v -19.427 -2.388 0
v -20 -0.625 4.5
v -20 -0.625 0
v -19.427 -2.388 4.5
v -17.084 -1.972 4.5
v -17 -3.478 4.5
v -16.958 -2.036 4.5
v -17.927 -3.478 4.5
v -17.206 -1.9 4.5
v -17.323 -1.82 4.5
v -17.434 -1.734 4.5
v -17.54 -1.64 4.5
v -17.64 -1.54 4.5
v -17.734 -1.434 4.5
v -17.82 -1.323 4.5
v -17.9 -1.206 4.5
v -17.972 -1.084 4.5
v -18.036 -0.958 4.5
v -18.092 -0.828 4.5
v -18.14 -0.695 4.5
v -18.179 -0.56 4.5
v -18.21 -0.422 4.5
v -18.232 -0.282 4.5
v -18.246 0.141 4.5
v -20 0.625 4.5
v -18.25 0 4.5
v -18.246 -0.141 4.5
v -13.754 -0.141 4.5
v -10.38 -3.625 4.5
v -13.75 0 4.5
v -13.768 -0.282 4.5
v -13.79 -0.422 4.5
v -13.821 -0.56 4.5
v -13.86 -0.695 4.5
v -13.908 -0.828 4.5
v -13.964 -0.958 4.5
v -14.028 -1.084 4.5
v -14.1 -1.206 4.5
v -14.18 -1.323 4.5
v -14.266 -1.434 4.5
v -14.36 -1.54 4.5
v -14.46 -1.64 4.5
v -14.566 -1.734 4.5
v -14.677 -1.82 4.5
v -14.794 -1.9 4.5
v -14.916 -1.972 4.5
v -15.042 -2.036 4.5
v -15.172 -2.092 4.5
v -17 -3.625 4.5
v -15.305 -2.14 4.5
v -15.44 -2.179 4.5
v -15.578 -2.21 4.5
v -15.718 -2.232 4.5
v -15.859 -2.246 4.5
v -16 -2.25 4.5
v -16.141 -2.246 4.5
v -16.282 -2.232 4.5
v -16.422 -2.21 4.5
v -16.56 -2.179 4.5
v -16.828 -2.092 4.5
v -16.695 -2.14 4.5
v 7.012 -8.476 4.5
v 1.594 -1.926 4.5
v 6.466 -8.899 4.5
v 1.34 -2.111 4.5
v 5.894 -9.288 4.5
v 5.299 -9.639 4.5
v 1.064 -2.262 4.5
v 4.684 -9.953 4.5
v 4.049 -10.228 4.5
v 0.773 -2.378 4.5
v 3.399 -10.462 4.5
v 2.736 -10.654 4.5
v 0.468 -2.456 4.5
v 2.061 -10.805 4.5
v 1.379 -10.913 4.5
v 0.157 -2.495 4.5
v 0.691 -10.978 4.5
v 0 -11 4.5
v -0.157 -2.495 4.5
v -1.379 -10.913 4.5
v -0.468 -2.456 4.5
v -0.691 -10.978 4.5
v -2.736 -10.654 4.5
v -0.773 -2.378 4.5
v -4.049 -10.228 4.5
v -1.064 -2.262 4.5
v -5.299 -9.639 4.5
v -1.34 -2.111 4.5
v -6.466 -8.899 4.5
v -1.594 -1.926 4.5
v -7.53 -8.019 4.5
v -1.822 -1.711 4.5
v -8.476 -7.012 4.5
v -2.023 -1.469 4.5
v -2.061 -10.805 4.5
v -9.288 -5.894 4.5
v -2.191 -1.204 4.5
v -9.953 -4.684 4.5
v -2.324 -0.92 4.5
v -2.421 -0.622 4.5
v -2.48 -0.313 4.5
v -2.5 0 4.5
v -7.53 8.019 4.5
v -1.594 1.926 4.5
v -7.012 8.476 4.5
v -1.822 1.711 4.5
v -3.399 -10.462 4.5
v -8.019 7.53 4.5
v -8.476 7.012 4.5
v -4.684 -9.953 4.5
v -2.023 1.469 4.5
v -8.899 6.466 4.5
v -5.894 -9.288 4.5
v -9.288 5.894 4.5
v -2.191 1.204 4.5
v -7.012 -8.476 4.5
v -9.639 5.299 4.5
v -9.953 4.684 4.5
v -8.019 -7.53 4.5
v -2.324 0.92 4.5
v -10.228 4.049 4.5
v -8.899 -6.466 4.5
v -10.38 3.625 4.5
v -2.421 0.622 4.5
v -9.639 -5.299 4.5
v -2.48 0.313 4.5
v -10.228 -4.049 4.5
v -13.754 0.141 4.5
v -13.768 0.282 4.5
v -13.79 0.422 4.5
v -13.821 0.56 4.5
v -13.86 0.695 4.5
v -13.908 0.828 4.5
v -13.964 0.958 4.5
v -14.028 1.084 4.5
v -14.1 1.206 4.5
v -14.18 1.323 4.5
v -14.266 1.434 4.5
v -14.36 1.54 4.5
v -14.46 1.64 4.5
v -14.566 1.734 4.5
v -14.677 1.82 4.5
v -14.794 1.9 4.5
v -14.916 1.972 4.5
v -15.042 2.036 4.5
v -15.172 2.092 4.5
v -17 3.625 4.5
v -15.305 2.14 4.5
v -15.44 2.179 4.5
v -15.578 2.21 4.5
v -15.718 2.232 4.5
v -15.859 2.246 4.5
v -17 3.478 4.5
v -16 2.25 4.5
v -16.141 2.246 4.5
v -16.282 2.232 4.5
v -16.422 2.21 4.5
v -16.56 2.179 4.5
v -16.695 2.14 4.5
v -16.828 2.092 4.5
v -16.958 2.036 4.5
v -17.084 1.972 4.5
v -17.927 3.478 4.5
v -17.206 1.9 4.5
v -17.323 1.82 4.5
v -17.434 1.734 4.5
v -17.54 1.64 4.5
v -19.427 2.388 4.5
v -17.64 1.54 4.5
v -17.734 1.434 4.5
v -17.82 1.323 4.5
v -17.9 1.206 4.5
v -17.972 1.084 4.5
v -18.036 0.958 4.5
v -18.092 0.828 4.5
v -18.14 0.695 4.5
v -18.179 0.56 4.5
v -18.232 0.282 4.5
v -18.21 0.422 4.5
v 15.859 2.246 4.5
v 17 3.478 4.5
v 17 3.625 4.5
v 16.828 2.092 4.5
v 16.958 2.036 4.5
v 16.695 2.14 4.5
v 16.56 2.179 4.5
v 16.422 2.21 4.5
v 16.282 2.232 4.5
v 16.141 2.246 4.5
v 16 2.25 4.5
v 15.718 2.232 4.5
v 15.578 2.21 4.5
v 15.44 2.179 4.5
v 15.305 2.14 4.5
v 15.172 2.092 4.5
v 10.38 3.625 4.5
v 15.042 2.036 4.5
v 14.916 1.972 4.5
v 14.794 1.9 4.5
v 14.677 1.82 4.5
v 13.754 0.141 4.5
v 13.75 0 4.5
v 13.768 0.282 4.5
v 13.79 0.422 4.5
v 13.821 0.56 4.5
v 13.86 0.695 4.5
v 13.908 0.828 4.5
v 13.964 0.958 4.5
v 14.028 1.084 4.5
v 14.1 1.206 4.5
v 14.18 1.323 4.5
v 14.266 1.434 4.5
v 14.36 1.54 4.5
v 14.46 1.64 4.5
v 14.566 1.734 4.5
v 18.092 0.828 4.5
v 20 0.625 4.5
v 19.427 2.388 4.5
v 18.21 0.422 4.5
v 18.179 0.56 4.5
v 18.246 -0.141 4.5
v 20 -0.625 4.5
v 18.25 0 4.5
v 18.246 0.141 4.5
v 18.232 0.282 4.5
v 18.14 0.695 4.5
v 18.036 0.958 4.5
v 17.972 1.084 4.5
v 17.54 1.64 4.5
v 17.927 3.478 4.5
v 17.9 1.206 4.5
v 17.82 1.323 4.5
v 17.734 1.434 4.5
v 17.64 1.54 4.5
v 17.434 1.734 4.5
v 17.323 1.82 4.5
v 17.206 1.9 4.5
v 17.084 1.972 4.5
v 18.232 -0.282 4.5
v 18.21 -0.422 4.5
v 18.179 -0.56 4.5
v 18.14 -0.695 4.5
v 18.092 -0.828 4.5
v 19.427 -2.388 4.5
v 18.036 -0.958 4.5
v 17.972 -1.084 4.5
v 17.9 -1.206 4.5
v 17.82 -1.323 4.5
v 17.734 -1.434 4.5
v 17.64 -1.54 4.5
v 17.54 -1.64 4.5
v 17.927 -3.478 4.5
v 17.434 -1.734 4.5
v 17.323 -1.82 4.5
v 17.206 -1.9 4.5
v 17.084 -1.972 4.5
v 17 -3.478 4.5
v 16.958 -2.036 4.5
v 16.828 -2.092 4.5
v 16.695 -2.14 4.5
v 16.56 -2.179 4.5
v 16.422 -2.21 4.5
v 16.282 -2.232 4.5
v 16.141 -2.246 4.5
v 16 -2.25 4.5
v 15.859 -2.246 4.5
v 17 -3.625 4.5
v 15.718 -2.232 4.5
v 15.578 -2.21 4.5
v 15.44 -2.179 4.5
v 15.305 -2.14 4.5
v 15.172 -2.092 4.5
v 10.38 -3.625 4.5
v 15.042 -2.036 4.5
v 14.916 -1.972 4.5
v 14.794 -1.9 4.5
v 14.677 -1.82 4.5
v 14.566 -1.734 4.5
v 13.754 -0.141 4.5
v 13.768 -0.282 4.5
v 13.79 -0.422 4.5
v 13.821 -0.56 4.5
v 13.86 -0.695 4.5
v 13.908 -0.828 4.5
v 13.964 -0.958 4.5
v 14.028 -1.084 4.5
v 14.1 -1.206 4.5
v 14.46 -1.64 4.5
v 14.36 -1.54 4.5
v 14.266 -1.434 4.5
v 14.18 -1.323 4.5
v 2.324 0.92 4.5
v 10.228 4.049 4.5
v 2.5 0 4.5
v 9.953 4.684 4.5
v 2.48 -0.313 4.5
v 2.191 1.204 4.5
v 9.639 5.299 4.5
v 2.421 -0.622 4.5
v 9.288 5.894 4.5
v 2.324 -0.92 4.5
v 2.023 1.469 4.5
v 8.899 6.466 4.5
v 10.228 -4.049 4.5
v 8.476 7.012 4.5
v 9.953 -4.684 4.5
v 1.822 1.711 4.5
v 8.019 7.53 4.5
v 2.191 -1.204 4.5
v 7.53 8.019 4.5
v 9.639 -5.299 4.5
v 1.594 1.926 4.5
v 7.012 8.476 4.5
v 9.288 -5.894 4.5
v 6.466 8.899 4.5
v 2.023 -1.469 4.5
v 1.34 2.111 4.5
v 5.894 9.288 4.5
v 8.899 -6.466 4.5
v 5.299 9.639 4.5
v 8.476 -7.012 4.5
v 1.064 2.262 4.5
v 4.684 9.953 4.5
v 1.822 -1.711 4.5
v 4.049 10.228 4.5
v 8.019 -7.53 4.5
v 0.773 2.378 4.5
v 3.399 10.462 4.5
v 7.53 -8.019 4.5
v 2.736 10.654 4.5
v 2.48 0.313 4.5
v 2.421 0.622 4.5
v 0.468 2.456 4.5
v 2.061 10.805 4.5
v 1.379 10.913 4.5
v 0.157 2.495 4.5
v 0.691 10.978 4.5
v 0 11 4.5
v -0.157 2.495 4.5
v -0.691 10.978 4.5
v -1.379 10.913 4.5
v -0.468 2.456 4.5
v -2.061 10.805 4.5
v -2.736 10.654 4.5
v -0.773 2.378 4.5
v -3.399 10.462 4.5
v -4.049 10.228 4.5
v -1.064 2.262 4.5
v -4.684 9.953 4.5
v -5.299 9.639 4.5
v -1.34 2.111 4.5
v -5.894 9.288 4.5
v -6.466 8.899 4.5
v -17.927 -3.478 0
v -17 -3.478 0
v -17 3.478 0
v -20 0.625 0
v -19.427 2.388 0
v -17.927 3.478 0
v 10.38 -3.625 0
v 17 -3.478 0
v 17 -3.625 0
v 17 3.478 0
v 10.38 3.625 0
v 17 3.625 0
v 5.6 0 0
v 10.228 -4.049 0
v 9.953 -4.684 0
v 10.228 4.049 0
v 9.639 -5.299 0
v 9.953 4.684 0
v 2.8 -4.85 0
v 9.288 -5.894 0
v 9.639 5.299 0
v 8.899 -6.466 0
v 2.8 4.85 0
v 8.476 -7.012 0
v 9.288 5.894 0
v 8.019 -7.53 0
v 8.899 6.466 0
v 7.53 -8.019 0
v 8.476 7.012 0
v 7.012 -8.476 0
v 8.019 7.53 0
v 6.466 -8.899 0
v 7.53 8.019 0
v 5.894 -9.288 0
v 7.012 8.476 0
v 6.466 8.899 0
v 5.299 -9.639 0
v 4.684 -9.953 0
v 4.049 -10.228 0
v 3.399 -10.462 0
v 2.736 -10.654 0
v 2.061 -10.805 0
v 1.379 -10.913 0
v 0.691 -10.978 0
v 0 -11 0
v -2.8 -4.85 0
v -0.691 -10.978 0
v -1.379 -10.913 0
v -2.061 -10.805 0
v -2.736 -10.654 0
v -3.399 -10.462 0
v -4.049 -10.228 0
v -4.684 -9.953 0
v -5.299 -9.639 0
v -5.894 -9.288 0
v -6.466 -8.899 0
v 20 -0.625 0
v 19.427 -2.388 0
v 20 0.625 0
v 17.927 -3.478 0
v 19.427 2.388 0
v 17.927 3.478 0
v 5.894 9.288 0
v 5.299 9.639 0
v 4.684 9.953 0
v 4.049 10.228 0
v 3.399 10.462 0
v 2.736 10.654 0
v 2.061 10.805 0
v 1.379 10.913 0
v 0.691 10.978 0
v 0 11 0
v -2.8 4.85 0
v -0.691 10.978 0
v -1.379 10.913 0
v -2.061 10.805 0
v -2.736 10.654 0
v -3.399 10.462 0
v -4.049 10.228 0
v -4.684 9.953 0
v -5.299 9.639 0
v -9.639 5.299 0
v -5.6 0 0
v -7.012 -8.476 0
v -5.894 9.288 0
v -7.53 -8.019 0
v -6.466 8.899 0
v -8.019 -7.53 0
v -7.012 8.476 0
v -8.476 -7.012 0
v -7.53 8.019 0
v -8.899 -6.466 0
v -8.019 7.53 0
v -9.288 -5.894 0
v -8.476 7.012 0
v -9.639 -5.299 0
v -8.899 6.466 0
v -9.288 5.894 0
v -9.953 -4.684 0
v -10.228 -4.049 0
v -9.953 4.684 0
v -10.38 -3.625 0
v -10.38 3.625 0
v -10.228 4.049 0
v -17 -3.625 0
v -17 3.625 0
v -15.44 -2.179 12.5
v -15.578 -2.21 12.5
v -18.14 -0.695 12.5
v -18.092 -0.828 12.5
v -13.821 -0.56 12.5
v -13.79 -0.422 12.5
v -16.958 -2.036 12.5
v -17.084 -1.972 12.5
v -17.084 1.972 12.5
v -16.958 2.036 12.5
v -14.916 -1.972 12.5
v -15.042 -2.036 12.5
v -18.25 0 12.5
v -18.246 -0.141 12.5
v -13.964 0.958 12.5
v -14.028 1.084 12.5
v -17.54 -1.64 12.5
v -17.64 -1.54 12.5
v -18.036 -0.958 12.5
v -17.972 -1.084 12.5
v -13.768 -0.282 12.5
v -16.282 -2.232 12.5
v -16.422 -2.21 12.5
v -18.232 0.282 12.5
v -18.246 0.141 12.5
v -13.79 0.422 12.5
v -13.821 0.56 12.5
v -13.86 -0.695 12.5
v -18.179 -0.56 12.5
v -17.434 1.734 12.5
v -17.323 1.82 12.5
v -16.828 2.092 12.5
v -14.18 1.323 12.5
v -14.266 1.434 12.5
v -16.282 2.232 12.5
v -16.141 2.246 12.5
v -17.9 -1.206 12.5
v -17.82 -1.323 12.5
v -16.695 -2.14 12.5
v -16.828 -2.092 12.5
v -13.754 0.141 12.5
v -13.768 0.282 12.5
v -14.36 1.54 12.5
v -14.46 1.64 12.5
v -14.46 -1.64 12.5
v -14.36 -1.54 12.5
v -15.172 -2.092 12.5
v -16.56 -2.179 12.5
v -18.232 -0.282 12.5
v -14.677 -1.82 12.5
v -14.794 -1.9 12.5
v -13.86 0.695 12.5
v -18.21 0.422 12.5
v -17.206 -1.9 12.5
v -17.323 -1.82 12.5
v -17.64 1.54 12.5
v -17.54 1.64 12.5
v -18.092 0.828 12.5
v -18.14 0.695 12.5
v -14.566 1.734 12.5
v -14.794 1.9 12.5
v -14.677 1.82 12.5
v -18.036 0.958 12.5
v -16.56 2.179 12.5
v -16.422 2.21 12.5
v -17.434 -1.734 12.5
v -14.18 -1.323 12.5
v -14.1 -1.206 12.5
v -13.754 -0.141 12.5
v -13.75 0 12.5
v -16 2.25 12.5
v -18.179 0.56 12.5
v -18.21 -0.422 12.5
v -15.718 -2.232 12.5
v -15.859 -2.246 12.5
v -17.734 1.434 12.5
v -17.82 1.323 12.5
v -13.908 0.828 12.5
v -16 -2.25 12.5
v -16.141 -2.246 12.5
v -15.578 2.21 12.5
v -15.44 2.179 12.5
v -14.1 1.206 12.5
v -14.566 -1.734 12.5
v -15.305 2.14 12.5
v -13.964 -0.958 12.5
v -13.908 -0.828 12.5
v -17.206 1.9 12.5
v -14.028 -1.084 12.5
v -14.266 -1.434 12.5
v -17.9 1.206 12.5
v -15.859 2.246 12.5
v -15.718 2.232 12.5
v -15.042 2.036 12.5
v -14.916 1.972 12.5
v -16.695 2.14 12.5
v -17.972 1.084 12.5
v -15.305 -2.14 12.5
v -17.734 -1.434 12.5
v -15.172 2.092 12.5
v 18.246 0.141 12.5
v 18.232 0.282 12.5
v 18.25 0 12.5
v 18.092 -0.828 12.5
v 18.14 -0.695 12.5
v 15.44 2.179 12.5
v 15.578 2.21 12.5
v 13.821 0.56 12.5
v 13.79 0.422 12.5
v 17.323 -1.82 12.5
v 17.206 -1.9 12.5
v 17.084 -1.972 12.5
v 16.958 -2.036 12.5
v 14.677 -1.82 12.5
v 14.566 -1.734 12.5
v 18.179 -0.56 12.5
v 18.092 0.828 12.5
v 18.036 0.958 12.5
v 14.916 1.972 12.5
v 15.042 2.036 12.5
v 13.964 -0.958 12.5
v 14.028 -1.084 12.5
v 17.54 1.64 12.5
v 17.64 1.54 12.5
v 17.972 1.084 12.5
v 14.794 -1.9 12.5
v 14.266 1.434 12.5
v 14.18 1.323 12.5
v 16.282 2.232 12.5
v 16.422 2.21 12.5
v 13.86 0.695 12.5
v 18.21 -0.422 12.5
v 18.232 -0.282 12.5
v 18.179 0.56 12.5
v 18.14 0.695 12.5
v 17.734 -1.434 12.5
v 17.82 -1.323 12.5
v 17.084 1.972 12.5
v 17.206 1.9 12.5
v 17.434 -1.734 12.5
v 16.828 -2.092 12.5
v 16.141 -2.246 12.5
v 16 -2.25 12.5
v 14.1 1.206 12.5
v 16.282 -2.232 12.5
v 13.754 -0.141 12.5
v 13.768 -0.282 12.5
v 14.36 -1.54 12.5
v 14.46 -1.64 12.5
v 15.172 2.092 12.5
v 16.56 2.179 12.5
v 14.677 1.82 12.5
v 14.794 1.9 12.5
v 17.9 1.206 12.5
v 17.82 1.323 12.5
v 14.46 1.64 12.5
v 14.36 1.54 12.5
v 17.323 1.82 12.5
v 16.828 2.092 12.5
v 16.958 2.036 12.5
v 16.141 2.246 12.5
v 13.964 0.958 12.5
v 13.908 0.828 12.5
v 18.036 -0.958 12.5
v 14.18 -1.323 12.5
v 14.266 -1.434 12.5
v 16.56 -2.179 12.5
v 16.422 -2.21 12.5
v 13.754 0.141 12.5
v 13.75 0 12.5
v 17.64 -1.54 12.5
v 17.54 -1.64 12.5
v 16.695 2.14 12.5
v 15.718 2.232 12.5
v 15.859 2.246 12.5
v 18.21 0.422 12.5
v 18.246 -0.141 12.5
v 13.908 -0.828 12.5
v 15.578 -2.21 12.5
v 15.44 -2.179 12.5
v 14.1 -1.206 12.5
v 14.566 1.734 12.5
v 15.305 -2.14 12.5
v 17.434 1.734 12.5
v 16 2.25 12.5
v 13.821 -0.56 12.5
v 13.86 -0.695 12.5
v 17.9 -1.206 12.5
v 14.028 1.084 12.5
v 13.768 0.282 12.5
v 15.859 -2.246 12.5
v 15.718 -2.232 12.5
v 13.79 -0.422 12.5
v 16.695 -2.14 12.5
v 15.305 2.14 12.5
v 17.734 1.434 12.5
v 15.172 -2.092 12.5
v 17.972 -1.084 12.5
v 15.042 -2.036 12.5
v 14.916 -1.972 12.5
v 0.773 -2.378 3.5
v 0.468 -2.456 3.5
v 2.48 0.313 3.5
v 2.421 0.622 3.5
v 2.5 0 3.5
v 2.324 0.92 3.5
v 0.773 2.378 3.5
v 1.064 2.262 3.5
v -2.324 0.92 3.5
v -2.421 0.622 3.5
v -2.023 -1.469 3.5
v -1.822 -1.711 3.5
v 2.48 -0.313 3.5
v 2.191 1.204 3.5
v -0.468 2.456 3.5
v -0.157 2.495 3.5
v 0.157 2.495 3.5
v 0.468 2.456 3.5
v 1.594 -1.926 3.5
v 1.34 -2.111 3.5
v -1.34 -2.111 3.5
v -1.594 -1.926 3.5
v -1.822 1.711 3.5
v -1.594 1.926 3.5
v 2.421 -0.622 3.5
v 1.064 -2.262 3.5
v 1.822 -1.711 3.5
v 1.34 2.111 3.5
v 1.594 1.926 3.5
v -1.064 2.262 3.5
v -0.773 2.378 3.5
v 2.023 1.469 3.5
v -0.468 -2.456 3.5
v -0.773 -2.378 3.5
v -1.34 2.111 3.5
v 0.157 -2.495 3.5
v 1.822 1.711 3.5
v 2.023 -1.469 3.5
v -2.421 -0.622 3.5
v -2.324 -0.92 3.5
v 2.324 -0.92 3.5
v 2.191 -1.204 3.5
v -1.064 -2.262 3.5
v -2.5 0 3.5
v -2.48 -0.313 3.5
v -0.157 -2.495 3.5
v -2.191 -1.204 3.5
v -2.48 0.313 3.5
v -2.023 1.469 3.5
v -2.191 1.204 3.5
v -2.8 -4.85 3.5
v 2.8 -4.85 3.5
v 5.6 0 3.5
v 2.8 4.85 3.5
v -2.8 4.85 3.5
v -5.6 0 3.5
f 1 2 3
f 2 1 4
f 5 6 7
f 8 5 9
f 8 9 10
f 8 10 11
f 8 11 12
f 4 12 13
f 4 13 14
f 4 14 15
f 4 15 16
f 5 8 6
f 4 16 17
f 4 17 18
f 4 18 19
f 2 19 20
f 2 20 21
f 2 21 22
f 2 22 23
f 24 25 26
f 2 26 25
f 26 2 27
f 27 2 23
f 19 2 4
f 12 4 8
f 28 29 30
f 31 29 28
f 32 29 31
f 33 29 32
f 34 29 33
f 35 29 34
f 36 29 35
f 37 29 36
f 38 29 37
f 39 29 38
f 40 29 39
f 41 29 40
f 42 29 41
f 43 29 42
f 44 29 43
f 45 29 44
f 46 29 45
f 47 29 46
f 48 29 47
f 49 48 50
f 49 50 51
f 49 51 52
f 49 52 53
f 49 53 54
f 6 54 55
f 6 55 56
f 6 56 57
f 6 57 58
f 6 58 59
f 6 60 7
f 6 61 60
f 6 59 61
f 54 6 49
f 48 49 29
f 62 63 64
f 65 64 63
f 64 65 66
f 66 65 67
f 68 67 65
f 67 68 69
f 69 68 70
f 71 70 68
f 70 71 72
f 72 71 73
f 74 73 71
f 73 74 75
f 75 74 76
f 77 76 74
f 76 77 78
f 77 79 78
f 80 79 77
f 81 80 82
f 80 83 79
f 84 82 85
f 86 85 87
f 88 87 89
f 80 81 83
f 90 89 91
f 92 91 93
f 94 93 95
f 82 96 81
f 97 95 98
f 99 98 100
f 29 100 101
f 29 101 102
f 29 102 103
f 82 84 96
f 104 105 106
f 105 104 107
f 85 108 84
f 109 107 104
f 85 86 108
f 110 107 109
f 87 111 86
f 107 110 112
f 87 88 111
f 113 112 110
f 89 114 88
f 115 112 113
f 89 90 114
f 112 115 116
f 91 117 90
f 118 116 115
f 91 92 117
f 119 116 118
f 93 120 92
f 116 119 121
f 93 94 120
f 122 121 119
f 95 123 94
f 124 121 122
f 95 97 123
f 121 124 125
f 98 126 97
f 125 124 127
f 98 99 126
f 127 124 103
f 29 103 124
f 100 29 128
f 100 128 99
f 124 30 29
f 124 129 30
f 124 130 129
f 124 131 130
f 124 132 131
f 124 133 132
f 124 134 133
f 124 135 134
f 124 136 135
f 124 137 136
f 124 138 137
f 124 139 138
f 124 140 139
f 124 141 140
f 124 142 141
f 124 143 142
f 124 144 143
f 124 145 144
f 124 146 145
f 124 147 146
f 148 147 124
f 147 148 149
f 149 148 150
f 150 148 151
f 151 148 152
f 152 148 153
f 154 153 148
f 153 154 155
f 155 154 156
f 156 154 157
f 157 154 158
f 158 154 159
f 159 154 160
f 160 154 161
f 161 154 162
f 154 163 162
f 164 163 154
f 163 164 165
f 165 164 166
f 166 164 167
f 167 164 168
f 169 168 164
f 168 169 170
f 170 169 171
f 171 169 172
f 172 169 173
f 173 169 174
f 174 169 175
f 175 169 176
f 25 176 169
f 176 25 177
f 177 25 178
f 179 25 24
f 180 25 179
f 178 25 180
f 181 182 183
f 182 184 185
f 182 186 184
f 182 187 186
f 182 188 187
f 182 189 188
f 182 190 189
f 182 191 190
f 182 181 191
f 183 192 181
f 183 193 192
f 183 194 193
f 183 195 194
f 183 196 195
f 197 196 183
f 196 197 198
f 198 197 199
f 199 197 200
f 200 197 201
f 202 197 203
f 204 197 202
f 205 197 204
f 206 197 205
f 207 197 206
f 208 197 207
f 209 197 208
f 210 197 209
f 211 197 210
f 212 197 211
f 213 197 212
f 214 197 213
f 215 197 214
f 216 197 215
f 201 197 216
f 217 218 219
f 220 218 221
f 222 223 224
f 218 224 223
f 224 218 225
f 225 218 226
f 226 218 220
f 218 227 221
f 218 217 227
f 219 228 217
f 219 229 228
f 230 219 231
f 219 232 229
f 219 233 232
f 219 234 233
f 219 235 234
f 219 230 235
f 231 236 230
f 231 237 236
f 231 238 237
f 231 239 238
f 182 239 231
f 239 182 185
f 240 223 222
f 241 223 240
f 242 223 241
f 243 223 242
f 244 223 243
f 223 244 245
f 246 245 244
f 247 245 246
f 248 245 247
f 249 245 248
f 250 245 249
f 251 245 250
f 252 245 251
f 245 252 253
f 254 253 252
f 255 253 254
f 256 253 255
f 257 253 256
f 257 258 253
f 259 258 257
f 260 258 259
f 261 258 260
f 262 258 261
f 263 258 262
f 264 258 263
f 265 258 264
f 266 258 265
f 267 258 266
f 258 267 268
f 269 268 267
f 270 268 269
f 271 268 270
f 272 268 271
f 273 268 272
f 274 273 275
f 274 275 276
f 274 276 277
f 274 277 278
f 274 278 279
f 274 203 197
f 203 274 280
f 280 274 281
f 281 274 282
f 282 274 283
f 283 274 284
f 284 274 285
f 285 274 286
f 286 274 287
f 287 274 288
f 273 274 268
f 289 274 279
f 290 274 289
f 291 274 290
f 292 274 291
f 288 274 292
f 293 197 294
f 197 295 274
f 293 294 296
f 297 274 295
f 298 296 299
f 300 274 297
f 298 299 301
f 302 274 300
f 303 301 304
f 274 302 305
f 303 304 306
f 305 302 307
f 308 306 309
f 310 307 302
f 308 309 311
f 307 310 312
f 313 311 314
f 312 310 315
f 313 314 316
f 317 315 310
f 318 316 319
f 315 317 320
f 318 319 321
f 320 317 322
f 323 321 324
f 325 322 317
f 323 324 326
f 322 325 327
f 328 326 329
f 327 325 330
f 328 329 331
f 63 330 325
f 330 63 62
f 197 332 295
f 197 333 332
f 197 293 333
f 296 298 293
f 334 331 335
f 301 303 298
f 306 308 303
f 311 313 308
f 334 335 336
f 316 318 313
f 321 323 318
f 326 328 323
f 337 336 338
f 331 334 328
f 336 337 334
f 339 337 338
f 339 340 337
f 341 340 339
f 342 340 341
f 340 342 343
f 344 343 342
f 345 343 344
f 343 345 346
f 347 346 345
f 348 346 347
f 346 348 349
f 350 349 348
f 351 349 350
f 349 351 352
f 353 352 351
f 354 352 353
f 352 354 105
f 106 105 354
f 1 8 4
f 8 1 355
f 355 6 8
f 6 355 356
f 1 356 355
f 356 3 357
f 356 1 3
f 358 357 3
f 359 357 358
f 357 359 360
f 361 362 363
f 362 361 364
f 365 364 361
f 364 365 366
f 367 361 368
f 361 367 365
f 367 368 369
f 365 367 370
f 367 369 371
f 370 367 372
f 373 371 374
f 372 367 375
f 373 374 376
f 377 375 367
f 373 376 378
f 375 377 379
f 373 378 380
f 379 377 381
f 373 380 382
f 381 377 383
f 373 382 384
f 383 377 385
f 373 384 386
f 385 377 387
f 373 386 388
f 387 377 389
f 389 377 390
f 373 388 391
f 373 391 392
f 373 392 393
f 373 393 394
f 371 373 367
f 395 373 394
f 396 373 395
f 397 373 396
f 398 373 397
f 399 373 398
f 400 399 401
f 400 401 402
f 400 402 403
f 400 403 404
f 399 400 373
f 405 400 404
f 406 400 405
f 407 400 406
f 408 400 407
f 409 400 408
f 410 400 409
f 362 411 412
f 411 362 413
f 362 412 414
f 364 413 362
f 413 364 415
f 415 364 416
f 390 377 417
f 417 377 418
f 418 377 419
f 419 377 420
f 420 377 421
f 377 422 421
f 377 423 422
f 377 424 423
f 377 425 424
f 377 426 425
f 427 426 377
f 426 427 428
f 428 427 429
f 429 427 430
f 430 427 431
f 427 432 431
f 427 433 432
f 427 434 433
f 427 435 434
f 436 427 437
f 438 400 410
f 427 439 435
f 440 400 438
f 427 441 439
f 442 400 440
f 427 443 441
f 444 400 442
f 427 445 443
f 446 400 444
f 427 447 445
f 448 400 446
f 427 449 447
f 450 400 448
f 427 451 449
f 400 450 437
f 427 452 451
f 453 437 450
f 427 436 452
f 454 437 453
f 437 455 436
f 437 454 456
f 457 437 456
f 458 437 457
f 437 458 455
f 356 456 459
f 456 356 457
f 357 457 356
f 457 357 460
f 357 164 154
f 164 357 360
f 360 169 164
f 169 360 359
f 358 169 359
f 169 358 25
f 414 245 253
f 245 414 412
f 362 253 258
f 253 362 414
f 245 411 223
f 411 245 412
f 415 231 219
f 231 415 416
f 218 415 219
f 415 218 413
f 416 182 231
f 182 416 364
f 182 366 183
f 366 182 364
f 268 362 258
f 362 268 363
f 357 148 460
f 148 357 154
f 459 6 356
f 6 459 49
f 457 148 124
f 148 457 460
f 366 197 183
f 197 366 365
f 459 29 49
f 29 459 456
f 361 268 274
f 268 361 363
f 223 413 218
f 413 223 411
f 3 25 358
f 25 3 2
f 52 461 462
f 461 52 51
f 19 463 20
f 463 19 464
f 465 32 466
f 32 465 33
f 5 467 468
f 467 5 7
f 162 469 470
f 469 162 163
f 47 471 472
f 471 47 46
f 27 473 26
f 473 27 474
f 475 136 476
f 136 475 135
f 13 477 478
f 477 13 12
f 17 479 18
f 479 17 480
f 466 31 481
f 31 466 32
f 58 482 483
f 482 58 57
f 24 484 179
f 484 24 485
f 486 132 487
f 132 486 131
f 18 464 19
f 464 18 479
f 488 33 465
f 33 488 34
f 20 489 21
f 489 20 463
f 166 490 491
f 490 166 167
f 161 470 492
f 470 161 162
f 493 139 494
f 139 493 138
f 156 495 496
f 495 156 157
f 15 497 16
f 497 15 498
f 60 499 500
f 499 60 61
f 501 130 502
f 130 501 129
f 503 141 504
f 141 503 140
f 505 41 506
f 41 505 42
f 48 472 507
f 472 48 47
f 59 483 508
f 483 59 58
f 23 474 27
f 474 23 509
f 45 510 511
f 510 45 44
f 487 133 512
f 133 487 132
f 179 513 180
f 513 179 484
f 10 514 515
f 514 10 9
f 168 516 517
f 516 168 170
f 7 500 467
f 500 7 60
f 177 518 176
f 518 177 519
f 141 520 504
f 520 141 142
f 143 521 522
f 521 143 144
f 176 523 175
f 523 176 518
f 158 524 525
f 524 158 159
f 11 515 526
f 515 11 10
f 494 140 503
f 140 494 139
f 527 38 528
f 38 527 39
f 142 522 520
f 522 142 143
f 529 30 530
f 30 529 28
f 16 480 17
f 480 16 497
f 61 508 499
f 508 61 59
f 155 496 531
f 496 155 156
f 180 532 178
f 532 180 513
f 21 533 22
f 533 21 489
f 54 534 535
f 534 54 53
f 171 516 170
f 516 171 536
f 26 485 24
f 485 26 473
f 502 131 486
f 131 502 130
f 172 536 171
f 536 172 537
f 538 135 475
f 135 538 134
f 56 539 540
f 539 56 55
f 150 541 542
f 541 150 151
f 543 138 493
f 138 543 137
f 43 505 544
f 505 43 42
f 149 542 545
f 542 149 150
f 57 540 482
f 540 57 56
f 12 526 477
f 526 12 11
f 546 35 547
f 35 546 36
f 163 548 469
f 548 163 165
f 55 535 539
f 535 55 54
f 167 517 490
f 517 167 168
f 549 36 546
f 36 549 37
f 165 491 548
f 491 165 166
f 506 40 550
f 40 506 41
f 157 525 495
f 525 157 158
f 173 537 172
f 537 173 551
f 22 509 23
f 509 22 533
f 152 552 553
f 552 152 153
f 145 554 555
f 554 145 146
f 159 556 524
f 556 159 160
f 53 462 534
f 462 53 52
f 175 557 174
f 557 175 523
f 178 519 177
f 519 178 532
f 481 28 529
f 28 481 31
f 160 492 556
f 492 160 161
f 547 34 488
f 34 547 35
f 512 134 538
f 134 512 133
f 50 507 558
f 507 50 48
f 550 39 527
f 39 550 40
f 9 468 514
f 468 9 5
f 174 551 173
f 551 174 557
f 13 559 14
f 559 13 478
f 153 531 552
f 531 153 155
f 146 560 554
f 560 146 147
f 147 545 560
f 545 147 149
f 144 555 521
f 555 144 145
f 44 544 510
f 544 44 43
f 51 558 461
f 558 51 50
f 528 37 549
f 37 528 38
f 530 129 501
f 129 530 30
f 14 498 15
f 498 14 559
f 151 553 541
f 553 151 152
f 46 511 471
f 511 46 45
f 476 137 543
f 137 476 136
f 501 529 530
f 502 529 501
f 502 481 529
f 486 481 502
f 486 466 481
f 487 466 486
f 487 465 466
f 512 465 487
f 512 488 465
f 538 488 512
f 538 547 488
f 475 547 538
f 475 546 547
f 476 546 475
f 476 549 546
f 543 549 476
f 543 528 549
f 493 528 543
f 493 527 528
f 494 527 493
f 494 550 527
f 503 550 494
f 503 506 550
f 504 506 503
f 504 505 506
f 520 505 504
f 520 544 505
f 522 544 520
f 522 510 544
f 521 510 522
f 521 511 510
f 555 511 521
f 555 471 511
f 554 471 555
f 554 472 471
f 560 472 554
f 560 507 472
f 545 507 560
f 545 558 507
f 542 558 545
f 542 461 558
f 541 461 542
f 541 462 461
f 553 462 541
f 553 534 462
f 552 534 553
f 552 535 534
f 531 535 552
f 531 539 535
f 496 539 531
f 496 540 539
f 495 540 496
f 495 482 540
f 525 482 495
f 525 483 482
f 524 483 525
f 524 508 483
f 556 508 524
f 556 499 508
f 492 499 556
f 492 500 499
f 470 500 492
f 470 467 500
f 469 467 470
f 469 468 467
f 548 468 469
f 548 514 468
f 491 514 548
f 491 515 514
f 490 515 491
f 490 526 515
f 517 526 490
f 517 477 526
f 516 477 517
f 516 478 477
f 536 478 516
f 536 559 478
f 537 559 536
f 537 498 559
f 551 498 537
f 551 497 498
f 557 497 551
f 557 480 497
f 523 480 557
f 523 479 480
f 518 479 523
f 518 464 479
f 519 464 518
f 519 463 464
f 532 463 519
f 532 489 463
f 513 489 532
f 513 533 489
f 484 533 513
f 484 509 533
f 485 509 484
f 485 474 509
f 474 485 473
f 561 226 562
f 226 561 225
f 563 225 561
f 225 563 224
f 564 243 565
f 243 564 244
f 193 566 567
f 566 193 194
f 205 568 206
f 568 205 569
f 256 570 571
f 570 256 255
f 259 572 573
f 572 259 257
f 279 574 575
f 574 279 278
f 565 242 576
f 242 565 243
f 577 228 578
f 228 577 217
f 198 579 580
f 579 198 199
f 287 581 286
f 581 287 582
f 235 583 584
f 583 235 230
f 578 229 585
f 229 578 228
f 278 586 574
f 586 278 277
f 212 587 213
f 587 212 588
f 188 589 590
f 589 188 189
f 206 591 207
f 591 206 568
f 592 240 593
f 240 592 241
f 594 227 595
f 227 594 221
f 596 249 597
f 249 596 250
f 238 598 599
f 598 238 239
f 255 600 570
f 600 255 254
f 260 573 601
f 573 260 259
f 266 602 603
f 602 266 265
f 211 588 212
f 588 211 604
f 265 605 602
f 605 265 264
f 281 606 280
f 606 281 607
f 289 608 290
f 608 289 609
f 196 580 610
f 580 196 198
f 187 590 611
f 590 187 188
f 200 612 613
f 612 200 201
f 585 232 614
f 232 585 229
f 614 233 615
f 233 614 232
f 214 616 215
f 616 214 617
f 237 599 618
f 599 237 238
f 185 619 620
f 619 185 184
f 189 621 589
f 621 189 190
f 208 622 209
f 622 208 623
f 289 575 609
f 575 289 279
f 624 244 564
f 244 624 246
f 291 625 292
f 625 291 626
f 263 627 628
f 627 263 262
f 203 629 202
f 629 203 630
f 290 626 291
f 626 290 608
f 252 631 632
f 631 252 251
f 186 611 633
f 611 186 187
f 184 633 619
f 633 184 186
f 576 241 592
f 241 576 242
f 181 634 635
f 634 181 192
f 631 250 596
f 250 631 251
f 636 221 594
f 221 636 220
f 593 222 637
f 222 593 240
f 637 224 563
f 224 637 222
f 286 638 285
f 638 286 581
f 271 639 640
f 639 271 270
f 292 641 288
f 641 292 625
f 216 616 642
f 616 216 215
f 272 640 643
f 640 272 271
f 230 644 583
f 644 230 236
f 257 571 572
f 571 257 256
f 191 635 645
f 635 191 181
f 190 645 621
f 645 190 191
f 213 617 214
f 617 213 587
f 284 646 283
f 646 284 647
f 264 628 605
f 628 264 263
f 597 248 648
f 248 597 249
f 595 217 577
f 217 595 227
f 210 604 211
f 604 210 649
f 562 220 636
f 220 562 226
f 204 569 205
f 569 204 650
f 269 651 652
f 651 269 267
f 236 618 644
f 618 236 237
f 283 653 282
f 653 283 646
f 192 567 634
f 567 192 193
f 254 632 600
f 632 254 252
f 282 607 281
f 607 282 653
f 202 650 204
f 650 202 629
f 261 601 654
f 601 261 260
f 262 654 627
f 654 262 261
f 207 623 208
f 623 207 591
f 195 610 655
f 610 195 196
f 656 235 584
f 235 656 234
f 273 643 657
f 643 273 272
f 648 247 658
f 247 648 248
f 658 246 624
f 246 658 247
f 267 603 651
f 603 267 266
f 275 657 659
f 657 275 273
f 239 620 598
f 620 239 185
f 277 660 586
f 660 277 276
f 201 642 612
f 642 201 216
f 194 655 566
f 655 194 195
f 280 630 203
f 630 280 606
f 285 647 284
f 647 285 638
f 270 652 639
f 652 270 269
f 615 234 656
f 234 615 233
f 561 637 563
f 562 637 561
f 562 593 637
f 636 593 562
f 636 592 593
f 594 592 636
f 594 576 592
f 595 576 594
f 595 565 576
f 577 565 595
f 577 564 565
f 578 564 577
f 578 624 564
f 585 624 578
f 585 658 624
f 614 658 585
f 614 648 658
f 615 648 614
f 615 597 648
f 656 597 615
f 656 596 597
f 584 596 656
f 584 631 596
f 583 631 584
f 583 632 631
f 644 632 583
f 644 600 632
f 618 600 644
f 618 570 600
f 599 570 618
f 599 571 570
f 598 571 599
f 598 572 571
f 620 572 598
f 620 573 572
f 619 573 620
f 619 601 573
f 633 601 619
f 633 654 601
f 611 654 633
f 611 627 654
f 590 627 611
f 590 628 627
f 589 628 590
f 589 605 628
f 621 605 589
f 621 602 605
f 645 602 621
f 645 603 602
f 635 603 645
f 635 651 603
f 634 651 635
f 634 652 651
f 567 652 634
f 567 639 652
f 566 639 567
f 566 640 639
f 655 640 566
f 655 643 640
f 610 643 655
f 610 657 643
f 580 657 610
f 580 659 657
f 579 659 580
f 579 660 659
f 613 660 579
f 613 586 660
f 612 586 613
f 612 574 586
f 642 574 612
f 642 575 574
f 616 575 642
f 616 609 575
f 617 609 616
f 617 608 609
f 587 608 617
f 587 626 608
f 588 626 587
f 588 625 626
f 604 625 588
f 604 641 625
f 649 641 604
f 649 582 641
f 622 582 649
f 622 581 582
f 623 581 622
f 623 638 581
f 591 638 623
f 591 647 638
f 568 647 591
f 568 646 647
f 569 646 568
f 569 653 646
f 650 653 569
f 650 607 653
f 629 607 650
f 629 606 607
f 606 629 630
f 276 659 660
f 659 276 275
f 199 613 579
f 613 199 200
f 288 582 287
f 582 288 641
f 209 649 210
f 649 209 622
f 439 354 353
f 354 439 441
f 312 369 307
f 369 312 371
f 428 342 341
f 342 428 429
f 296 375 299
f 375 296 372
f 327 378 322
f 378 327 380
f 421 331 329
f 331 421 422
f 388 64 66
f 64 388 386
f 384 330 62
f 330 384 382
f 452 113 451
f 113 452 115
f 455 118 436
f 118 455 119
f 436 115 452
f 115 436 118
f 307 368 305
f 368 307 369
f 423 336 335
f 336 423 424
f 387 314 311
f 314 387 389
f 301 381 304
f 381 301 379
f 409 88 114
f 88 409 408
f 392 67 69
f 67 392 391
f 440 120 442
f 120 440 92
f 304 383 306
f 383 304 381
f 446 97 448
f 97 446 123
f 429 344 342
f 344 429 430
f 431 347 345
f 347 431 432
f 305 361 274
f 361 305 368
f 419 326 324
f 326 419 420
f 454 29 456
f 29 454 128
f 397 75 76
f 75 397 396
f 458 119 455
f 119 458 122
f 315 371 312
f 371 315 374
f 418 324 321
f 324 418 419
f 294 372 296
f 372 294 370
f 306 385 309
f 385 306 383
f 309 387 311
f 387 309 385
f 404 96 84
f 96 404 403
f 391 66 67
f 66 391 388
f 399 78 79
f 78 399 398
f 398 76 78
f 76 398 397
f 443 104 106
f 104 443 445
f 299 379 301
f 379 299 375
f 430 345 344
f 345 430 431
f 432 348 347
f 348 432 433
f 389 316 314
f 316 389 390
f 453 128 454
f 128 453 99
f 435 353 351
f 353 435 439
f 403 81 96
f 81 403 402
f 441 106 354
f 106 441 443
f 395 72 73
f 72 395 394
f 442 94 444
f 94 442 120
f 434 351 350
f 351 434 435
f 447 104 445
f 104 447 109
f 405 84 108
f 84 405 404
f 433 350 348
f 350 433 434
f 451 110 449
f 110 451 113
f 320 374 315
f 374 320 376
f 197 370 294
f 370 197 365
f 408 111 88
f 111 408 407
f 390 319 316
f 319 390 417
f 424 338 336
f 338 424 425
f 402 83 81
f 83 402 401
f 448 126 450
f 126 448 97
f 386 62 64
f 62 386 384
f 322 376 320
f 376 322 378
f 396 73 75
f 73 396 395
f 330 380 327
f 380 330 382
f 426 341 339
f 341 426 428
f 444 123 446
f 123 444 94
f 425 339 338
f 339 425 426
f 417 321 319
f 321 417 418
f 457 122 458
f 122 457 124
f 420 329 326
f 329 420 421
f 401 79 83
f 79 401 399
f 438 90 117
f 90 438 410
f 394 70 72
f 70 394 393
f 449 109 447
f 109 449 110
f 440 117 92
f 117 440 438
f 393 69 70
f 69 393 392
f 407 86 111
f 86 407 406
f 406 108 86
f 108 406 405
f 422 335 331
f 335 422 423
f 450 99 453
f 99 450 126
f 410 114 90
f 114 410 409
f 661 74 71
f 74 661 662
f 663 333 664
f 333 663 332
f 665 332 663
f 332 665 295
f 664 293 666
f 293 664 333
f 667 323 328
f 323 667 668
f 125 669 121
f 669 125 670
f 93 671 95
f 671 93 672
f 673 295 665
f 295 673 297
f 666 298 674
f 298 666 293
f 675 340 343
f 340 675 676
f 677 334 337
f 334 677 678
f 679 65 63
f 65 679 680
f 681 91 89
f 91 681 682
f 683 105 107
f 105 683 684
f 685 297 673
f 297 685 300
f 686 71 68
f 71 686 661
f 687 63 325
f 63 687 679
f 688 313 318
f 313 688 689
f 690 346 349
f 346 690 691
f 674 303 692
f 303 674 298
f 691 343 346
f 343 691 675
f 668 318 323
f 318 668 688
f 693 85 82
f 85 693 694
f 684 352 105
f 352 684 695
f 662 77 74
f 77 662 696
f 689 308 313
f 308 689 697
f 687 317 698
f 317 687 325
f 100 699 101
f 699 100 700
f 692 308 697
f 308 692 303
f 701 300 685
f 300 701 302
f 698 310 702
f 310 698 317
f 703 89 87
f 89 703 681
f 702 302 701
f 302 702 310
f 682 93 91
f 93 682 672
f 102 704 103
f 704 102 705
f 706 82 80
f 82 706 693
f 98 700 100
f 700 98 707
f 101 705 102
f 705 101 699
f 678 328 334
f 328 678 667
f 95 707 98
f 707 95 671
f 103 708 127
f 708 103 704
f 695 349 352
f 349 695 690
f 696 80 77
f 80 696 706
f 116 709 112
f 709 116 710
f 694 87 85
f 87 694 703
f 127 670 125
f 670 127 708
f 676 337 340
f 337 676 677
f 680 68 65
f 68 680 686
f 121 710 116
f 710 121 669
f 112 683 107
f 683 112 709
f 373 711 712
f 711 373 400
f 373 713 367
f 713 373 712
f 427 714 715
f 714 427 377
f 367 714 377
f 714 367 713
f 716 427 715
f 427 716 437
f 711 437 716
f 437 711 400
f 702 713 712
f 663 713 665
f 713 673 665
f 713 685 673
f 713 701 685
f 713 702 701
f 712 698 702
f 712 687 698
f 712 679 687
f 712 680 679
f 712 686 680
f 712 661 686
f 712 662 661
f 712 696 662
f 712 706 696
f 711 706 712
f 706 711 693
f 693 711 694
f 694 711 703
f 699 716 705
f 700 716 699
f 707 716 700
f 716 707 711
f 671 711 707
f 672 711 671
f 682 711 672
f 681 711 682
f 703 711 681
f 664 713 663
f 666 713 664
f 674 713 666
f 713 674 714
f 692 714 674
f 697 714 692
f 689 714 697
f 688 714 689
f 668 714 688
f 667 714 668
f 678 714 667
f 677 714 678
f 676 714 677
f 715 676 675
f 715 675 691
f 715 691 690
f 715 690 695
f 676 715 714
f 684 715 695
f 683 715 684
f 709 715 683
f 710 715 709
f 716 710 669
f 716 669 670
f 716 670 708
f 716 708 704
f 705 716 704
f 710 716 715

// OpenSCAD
include <MCAD/boxes.scad>

h = 4.5;
peg_h = 8;
peg_r = 4.5 / 2;
peg_off = 16;

module servo_direct_arm() {
        difference() {
                union() {
                        cylinder(h = h, r = 11, center = false, $fn=100);
                        translate([0, 0, h/2])
                                roundedBox([40, 7.25, h], 3, true);

                        // pegs
                        for(i = [1 : 2]) {
                                rotate([0, 0, 180 * i])
                                translate([peg_off, 0, 0])
                                cylinder(h = peg_h + h, r = peg_r, center = false, $fn=100);
                        }
                }

                // rod hole
                cylinder(h = 40, r = 5/2, center = true, $fn=50);
                // nut hole
                translate([0,0,-1]) {
                        #cylinder(h = h, r = 11.2/2, center = false, $fa=60);
                }

        }
}

servo_direct_arm();
